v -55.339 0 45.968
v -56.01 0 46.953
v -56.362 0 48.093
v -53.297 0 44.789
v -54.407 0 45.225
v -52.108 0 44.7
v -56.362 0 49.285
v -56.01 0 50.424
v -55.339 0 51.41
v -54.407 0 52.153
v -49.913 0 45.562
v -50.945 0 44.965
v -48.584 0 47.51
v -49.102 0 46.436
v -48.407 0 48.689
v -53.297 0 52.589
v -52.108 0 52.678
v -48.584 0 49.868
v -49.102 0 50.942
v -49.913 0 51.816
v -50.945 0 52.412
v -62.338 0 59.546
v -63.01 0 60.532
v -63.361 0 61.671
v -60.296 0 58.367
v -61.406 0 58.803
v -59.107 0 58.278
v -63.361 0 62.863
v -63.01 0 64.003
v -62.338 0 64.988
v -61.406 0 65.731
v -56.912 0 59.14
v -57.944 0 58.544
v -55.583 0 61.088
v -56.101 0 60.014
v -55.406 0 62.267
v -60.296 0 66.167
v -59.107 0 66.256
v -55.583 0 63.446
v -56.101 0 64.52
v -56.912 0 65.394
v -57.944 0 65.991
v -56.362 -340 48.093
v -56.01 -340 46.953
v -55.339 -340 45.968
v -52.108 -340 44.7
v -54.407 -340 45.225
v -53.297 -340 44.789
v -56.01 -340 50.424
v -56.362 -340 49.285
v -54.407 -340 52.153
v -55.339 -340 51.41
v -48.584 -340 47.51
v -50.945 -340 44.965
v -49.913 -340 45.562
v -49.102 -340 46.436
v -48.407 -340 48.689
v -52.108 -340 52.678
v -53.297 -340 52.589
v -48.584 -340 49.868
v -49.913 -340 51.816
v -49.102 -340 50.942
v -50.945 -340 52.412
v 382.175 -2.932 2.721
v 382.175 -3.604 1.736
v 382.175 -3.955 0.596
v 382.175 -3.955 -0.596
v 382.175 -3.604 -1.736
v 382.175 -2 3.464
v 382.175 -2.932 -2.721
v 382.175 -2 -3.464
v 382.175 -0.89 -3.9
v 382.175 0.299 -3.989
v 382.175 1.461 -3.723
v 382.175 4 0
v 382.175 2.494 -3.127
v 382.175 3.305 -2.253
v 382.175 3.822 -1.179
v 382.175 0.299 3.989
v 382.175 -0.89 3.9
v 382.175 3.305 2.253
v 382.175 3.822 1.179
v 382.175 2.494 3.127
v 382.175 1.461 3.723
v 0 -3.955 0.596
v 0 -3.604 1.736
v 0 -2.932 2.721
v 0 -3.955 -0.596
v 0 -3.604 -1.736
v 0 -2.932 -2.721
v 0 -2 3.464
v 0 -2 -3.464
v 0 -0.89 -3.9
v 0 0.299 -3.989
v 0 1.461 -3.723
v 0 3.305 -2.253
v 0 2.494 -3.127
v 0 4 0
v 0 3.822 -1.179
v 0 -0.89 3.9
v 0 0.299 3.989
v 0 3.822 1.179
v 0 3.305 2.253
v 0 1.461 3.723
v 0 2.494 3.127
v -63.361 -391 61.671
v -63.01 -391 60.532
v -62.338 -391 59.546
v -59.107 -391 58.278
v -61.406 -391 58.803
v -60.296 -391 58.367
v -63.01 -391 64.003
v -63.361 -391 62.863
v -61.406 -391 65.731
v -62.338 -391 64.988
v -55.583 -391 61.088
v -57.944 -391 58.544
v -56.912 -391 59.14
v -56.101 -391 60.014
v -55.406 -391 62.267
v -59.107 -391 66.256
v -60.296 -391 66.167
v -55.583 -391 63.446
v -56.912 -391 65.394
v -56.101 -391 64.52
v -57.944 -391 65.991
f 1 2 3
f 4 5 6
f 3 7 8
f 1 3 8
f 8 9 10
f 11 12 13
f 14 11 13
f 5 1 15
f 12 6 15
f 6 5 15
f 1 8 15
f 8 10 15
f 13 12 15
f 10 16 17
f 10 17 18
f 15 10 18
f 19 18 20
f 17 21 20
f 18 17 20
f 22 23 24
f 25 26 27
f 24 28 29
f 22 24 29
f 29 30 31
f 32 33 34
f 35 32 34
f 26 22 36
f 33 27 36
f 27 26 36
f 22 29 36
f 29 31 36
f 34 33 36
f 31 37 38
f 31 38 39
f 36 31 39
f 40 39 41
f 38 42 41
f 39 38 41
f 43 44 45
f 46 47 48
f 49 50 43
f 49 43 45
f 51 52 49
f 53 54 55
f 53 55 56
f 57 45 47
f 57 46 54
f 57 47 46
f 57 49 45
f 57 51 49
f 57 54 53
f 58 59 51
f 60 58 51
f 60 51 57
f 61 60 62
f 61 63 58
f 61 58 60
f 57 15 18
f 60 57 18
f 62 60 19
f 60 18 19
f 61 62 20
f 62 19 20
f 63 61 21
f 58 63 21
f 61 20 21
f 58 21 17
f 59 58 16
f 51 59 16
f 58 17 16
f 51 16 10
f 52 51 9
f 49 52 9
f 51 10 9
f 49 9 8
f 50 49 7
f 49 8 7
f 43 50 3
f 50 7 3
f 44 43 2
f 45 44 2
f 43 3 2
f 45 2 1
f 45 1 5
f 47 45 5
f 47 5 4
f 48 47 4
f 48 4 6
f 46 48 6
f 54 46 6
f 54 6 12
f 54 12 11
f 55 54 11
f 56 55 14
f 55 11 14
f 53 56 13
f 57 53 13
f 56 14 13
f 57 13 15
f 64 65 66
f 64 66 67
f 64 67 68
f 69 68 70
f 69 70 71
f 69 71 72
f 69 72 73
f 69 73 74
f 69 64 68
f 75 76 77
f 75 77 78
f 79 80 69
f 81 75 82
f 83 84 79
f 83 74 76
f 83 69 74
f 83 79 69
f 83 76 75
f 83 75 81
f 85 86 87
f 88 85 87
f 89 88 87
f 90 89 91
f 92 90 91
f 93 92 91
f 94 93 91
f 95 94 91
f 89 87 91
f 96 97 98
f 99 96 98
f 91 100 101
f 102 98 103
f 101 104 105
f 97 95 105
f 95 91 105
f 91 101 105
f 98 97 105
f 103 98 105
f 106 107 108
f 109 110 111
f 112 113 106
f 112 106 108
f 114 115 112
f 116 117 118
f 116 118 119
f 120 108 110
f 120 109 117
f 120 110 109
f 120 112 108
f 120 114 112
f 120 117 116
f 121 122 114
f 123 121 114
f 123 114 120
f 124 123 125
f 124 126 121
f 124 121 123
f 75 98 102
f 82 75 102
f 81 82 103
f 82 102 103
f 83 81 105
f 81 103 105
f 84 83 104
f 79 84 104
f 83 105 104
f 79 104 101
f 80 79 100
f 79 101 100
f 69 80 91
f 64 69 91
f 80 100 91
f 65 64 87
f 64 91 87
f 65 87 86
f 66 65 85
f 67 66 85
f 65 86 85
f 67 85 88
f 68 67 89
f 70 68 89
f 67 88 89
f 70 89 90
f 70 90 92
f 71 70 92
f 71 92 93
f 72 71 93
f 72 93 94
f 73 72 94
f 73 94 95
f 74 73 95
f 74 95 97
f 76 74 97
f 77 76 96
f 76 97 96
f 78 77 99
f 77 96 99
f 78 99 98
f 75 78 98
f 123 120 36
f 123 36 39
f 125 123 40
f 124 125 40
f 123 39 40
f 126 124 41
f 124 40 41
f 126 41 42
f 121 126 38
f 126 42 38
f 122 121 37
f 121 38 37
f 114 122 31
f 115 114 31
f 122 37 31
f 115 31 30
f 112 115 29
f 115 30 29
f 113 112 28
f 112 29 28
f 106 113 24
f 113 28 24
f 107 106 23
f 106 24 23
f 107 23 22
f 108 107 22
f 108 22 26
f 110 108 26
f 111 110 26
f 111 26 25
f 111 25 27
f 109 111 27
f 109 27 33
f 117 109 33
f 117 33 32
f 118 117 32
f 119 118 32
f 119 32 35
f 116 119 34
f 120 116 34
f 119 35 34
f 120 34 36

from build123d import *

# Parameters (mm, degrees)
F0_R     = 4
F4_DEPTH = 382.175
F1_R     = 4
F5_DEPTH = 391
F6_R     = 4
F7_DEPTH = 340


with BuildPart() as f4:
    # F0 (on Right) → F4 (new body)
    with BuildSketch(Plane.YZ):
        Circle(F0_R)
    extrude(amount=F4_DEPTH)


with BuildPart() as f5:
    # F1 (on Front) → F5 (new body)
    with BuildSketch(Plane.XZ):
        with Locations((-59.4056621194, 62.2670501471)):
            Circle(F1_R)
    extrude(amount=F5_DEPTH)


with BuildPart() as f7:
    # F6 (on Front) → F7 (new body)
    with BuildSketch(Plane.XZ):
        with Locations((-52.4065308273, 48.6889071763)):
            Circle(F6_R)
    extrude(amount=F7_DEPTH)


solid = Compound([f4.part, f5.part, f7.part])
